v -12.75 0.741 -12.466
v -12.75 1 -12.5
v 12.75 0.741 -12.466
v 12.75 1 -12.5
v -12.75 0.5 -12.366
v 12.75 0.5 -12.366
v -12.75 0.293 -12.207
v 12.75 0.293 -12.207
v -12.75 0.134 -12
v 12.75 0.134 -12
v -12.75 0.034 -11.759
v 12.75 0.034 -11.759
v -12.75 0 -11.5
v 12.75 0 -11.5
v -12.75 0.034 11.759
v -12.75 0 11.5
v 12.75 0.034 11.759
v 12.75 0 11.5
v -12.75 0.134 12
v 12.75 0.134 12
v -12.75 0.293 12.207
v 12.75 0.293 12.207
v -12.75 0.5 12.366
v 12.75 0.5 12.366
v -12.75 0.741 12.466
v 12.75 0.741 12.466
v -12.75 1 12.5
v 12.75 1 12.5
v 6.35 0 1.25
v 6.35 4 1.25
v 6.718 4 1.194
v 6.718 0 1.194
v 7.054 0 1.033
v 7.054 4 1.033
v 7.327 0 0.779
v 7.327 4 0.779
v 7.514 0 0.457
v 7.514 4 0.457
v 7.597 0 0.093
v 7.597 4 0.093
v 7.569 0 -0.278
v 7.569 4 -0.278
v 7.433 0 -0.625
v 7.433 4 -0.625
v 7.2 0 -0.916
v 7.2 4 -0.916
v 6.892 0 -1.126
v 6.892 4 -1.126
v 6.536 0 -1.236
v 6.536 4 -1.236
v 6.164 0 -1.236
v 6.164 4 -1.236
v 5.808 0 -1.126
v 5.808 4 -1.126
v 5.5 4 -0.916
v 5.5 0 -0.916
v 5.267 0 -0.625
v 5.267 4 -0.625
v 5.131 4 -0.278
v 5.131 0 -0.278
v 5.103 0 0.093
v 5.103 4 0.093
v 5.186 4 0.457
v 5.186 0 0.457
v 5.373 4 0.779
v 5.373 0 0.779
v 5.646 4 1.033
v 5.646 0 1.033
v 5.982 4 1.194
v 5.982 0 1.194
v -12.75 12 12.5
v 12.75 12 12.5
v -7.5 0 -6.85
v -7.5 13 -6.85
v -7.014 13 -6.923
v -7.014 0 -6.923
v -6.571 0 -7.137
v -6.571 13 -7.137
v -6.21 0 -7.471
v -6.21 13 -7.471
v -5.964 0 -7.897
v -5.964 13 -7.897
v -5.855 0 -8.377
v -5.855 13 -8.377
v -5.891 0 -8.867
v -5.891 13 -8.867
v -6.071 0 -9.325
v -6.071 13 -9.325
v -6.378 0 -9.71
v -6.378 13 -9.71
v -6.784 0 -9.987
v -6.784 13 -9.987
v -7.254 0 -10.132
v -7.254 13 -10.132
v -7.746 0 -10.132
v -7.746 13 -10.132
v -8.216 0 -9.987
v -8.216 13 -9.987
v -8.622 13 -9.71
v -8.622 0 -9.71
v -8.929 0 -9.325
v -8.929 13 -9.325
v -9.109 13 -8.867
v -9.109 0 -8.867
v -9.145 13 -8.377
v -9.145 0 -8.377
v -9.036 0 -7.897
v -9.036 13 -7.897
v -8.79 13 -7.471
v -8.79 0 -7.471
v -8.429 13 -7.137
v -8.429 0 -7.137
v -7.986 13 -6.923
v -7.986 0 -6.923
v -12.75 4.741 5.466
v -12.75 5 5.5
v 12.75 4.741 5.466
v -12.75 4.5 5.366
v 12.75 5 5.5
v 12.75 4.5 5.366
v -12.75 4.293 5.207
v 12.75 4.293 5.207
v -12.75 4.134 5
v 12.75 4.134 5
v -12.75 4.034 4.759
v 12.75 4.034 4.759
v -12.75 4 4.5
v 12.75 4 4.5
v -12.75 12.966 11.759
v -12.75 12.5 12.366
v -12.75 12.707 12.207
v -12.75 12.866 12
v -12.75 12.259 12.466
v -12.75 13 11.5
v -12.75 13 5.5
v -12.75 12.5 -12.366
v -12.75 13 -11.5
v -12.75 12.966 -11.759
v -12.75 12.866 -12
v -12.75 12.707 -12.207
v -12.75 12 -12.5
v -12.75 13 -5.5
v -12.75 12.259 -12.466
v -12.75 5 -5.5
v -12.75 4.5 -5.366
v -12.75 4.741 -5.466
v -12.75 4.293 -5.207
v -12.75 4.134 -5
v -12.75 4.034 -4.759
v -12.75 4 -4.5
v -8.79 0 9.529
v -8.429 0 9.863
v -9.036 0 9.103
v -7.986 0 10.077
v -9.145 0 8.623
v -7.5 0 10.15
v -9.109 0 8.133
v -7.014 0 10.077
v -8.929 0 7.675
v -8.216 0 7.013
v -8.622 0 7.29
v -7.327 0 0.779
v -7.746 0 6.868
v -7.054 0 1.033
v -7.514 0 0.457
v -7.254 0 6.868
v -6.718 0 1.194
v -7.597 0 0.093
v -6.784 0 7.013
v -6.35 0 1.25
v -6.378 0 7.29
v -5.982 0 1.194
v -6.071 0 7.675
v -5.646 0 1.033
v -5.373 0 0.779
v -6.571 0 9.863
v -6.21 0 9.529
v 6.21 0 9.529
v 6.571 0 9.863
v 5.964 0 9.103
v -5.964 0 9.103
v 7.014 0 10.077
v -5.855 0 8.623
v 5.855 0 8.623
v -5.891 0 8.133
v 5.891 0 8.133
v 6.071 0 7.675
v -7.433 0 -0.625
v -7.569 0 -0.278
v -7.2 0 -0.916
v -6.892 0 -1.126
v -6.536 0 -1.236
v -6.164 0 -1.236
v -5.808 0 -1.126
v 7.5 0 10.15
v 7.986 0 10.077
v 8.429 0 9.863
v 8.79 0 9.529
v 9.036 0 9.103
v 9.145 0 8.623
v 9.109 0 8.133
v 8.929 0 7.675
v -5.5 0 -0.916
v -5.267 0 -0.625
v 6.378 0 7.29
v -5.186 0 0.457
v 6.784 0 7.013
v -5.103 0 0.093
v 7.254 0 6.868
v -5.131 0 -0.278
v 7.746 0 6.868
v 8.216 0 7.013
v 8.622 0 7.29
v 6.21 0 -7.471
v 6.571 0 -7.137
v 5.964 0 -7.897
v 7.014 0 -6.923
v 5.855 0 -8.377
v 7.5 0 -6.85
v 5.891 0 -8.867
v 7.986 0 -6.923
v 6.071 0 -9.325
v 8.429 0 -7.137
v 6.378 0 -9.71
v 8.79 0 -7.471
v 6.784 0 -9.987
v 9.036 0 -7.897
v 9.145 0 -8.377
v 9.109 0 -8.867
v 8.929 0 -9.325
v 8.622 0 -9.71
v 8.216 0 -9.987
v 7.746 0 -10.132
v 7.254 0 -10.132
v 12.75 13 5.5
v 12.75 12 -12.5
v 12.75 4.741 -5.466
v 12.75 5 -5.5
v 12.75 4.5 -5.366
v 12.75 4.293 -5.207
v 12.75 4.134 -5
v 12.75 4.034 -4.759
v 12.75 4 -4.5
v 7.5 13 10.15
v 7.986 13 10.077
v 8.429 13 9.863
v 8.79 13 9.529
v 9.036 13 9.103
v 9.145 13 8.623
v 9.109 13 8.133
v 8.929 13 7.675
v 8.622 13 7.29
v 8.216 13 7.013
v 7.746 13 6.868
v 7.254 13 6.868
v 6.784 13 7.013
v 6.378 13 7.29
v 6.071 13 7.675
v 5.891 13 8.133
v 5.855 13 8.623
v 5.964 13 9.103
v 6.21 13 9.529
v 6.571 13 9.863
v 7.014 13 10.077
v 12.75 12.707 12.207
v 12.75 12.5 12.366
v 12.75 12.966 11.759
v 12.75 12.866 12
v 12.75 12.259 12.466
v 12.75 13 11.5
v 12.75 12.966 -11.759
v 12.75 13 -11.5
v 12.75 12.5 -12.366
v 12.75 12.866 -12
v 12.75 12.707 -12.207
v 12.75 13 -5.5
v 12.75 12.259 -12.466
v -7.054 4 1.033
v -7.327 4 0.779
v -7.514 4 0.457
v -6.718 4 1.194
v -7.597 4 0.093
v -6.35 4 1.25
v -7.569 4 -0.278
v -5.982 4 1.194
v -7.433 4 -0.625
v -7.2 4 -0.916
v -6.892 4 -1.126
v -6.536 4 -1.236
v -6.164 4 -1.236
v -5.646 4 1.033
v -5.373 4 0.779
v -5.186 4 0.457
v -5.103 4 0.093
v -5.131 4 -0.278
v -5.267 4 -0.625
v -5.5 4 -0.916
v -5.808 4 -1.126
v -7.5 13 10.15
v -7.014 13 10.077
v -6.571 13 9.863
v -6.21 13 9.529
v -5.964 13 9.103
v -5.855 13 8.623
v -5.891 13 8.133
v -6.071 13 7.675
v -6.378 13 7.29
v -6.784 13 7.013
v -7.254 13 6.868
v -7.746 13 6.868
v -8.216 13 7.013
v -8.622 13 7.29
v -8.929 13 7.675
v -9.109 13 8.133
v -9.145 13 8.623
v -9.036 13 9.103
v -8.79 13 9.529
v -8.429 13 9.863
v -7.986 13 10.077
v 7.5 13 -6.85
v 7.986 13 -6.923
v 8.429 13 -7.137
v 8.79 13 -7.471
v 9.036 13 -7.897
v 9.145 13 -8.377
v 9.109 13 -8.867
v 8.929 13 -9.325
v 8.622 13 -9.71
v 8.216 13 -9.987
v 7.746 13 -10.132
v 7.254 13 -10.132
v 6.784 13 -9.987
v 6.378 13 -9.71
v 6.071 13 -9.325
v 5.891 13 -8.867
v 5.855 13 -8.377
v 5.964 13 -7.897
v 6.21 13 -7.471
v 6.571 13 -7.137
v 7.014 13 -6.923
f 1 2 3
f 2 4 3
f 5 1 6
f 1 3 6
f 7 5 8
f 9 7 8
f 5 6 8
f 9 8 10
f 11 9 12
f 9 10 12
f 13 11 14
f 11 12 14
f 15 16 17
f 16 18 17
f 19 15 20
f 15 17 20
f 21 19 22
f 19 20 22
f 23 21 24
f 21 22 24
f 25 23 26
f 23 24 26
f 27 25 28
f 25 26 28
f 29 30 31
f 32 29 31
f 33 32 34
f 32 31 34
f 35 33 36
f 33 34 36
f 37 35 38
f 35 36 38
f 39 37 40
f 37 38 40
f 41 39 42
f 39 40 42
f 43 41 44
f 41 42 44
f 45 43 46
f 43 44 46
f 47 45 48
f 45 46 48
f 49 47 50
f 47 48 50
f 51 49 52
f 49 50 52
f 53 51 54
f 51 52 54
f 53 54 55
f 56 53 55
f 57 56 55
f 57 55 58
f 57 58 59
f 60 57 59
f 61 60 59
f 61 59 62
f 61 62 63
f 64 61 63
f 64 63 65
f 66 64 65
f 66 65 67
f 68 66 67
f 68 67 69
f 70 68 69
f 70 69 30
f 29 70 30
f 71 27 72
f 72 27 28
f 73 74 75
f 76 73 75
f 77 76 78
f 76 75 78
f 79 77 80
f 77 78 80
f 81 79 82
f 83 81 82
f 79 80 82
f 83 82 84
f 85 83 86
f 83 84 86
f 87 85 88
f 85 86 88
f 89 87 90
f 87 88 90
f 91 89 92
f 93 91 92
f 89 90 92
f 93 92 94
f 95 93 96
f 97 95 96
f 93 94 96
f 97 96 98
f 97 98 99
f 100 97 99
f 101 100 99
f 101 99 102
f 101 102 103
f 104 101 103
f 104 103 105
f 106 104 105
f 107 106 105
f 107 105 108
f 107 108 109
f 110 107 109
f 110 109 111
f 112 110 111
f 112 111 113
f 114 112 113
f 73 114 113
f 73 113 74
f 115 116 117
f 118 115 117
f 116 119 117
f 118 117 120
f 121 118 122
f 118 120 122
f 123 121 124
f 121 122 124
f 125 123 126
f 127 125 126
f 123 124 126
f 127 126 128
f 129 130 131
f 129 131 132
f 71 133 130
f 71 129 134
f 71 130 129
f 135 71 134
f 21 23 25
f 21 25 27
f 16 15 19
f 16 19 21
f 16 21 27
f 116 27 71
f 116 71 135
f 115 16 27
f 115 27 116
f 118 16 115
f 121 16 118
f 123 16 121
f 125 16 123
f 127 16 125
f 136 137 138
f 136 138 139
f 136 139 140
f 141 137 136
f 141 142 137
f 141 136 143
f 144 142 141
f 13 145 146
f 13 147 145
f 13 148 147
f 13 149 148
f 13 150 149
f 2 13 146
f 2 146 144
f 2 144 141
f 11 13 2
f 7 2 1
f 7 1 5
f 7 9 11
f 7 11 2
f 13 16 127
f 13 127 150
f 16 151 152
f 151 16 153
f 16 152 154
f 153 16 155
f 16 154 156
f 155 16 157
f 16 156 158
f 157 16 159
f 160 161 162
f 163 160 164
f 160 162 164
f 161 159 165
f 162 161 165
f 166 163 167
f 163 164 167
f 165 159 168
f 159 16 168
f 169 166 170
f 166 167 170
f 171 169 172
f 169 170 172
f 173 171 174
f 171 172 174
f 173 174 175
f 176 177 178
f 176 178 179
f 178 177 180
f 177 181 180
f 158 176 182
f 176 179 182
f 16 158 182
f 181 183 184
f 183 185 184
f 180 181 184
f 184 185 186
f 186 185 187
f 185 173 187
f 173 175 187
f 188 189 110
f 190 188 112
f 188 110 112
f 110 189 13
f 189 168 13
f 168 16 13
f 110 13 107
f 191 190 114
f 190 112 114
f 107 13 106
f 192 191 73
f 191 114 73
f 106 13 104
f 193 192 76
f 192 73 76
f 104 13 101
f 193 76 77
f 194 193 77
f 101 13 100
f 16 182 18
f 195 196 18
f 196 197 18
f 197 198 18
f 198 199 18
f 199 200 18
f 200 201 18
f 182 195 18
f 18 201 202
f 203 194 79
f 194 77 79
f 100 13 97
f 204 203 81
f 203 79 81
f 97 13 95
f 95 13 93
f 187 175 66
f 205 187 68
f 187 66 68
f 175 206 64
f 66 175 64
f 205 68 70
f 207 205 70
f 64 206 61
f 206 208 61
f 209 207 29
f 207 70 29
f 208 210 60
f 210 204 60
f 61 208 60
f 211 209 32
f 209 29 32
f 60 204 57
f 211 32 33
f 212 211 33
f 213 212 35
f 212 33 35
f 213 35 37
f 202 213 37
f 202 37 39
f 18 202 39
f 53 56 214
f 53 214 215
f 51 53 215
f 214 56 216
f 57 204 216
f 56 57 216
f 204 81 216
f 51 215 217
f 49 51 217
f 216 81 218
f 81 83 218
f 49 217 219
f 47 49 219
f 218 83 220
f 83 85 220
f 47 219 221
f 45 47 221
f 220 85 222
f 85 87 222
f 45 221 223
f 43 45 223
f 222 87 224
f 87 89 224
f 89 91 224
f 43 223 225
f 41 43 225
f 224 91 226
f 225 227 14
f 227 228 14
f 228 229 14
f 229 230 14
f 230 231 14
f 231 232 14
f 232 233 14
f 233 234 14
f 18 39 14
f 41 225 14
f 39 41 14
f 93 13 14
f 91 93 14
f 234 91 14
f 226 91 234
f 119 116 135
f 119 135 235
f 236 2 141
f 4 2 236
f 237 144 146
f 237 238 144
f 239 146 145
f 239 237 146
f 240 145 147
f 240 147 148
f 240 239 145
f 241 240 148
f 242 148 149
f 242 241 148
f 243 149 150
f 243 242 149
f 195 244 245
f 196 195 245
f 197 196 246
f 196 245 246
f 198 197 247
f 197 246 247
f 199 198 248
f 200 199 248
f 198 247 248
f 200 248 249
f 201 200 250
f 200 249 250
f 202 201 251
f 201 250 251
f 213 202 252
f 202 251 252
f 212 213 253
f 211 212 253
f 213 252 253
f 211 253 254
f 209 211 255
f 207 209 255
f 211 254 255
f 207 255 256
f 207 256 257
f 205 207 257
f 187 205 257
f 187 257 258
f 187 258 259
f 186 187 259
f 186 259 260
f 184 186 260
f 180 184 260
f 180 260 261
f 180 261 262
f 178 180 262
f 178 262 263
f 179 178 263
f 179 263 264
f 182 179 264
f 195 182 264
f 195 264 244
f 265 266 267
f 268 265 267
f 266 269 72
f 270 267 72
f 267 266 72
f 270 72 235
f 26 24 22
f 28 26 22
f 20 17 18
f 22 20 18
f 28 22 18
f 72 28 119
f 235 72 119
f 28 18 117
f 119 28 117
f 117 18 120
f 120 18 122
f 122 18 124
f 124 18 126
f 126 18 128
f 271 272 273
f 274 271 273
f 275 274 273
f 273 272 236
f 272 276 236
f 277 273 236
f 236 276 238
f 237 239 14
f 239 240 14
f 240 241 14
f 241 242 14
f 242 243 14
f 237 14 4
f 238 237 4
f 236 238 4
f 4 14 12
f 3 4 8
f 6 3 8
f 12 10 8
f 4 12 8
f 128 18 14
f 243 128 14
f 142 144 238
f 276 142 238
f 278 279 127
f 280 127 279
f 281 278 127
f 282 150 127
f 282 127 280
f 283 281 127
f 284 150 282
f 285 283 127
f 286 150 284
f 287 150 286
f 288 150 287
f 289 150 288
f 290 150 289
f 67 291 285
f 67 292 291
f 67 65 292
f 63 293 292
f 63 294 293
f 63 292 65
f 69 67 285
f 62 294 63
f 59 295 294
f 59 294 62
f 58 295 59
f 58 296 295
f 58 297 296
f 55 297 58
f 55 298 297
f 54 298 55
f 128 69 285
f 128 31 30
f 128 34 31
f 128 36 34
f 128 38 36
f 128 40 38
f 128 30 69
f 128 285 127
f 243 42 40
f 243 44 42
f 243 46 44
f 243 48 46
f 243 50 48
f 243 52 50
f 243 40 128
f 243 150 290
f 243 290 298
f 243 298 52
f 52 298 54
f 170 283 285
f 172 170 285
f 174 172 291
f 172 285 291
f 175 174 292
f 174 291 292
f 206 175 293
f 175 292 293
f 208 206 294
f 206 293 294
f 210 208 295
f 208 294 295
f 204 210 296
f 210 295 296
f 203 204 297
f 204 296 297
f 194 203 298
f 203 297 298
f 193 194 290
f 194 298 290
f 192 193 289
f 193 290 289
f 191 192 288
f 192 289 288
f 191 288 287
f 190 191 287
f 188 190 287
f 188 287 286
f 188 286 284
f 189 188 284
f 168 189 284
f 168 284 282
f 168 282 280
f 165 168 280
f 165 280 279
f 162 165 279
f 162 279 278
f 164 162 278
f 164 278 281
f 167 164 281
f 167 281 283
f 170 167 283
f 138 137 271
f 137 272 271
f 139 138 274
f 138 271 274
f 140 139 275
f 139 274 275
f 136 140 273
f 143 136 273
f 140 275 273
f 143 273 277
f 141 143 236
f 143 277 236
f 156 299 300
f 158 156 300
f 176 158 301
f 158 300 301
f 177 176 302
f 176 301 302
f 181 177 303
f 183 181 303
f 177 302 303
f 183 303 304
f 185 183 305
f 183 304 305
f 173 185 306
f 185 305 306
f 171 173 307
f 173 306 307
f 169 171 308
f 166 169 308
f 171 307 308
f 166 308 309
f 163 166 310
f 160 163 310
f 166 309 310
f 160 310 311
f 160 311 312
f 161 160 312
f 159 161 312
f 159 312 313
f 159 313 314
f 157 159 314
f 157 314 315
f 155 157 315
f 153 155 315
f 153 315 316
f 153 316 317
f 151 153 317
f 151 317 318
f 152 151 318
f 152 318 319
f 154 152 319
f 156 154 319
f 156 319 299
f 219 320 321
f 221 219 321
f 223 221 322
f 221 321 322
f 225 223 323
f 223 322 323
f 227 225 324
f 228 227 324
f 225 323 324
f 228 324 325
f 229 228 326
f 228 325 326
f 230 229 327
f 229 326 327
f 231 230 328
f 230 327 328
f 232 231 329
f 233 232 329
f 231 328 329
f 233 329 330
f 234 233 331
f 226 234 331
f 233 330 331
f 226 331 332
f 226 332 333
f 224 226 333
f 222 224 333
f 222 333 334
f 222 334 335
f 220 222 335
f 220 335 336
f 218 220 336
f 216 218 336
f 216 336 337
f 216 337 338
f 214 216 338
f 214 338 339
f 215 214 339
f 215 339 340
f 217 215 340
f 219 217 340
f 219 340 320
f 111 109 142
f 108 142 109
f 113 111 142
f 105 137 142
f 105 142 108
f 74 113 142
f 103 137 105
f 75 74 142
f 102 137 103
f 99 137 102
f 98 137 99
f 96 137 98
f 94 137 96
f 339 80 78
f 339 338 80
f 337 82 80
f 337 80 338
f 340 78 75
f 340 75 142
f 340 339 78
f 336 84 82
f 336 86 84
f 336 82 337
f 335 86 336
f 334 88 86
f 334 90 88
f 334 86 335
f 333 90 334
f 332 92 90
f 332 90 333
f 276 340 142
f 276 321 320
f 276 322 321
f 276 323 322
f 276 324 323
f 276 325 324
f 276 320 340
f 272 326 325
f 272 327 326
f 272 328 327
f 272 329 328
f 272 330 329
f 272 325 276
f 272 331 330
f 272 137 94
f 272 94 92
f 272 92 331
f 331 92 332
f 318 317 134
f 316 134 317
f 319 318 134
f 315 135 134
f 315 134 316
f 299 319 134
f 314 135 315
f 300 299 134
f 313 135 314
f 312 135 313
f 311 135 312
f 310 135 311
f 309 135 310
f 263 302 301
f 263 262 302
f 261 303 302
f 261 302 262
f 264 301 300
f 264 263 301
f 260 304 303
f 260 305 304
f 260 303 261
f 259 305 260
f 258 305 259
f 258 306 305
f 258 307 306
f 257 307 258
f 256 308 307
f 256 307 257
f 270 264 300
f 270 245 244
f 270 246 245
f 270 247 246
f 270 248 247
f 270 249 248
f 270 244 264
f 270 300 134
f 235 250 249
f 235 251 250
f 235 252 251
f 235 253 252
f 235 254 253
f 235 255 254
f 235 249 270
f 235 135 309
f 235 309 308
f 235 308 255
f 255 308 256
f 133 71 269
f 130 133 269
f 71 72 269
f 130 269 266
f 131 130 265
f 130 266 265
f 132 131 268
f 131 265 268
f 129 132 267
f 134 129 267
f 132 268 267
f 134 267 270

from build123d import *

# Parameters (mm, degrees)
SKETCH_1_W         = 25.5
SKETCH_1_H         = 25
EXTRUDE_1_DEPTH    = 4
SKETCH_6_W         = 25.5
SKETCH_6_H         = 7
EXTRUDE_2_DEPTH    = 9
HOLE_WIZARD_M3_1_D = 2.5
HOLE_WIZARD_M4_3_D = 3.3
FILLET_1_R         = 1


with BuildPart() as part:
    # 草图1 → 凸台-拉伸1 (new body)
    with BuildSketch(Plane(origin=(0, 0, 0), x_dir=(1, 0, 0), z_dir=(0, 1, 0))):
        Rectangle(SKETCH_1_W, SKETCH_1_H)
    extrude(amount=EXTRUDE_1_DEPTH)

    # 草图6 → 凸台-拉伸2 (add)
    with BuildSketch(Plane(origin=(0, 4, 0), x_dir=(1, 0, 0), z_dir=(0, 1, 0))):
        with Locations((0, 9)):
            Rectangle(SKETCH_6_W, SKETCH_6_H)
        with Locations((0, -9)):
            Rectangle(SKETCH_6_W, SKETCH_6_H)
    extrude(amount=EXTRUDE_2_DEPTH)

    # M3 螺纹孔1 (through all)
    with Locations(Plane(origin=(6.35, 0, 0), x_dir=(0, 0, -1), z_dir=(0, -1, 0))):
        with Locations((0, 0), (0, -12.7)):
            Hole(HOLE_WIZARD_M3_1_D / 2)

    # M4 螺纹孔3 (through all)
    with Locations(Plane(origin=(7.5, 0, 8.5), x_dir=(0, 0, -1), z_dir=(0, -1, 0))):
        with Locations((0, 0), (0, -15), (17, -15), (17, 0)):
            Hole(HOLE_WIZARD_M4_3_D / 2)

    # 圆角1
    fillet_1_edges = [part.edges().sort_by_distance(p)[0] for p in [
        (0, 4, -5.5),
        (0, 13, -12.5),
        (0, 4, 5.5),
        (0, 13, 12.5),
        (0, 0, 12.5),
        (0, 0, -12.5),
    ]]
    fillet(fillet_1_edges, radius=FILLET_1_R)


solid = part.part
